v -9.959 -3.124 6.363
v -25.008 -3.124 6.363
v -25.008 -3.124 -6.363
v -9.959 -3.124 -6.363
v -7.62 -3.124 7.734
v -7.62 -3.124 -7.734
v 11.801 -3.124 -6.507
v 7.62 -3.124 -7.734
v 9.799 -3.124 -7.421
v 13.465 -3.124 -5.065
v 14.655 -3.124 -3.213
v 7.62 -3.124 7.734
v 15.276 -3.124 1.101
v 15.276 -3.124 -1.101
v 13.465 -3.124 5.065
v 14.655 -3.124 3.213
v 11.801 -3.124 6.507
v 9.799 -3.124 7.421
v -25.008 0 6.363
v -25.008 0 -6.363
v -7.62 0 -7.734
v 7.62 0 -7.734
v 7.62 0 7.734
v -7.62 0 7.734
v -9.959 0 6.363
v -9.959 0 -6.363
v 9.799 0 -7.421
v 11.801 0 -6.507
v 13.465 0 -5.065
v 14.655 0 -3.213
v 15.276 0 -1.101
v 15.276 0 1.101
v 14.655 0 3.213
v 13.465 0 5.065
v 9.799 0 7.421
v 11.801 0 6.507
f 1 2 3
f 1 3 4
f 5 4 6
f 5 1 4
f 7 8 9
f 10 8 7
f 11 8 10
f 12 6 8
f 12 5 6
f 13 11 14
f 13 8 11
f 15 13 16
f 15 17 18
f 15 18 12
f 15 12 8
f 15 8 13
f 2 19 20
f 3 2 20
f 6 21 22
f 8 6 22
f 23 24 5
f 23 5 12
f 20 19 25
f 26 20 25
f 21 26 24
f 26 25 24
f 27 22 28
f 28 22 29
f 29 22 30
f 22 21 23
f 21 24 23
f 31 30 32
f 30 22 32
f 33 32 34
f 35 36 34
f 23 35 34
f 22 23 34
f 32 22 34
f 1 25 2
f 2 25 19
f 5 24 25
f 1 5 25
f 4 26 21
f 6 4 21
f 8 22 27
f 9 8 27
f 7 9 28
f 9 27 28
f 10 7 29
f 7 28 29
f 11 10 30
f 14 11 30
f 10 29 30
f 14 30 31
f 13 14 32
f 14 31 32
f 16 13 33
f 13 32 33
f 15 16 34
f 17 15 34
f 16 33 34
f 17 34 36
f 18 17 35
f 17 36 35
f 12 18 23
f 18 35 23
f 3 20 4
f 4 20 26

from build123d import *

# Parameters (mm, degrees)
F0_W     = 15.24
F0_H     = 15.4686
F1_DEPTH = 3.1242


# Not quite as in the source:
# - the program builds the solid bodies; features that only make, move or delete a surface that nothing else refers to are left out


with BuildPart() as f1:
    # F0 (on Front) → F1 (new body)
    with BuildSketch(Plane.XZ):
        Polygon((-7.62, -7.7343), (-7.62, 7.7343), (-9.9592747303, 6.3627), (-20.8109102848, 0), (-9.9592747303, -6.3627), align=None)
        Rectangle(F0_W, F0_H)
        with BuildLine():
            ThreePointArc((7.62, -7.7343), (15.3543, 0), (7.62, 7.7343))
            Line((7.62, 7.7343), (7.62, -7.7343))
        make_face()
        Polygon((-20.8109102848, 0), (-9.9592747303, 6.3627), (-22.6592747303, 6.3627), (-25.0076241791, 6.3627), (-25.0076241791, -6.3627), (-22.6592747303, -6.3627), (-9.9592747303, -6.3627), align=None)
    extrude(amount=F1_DEPTH)


solid = f1.part
